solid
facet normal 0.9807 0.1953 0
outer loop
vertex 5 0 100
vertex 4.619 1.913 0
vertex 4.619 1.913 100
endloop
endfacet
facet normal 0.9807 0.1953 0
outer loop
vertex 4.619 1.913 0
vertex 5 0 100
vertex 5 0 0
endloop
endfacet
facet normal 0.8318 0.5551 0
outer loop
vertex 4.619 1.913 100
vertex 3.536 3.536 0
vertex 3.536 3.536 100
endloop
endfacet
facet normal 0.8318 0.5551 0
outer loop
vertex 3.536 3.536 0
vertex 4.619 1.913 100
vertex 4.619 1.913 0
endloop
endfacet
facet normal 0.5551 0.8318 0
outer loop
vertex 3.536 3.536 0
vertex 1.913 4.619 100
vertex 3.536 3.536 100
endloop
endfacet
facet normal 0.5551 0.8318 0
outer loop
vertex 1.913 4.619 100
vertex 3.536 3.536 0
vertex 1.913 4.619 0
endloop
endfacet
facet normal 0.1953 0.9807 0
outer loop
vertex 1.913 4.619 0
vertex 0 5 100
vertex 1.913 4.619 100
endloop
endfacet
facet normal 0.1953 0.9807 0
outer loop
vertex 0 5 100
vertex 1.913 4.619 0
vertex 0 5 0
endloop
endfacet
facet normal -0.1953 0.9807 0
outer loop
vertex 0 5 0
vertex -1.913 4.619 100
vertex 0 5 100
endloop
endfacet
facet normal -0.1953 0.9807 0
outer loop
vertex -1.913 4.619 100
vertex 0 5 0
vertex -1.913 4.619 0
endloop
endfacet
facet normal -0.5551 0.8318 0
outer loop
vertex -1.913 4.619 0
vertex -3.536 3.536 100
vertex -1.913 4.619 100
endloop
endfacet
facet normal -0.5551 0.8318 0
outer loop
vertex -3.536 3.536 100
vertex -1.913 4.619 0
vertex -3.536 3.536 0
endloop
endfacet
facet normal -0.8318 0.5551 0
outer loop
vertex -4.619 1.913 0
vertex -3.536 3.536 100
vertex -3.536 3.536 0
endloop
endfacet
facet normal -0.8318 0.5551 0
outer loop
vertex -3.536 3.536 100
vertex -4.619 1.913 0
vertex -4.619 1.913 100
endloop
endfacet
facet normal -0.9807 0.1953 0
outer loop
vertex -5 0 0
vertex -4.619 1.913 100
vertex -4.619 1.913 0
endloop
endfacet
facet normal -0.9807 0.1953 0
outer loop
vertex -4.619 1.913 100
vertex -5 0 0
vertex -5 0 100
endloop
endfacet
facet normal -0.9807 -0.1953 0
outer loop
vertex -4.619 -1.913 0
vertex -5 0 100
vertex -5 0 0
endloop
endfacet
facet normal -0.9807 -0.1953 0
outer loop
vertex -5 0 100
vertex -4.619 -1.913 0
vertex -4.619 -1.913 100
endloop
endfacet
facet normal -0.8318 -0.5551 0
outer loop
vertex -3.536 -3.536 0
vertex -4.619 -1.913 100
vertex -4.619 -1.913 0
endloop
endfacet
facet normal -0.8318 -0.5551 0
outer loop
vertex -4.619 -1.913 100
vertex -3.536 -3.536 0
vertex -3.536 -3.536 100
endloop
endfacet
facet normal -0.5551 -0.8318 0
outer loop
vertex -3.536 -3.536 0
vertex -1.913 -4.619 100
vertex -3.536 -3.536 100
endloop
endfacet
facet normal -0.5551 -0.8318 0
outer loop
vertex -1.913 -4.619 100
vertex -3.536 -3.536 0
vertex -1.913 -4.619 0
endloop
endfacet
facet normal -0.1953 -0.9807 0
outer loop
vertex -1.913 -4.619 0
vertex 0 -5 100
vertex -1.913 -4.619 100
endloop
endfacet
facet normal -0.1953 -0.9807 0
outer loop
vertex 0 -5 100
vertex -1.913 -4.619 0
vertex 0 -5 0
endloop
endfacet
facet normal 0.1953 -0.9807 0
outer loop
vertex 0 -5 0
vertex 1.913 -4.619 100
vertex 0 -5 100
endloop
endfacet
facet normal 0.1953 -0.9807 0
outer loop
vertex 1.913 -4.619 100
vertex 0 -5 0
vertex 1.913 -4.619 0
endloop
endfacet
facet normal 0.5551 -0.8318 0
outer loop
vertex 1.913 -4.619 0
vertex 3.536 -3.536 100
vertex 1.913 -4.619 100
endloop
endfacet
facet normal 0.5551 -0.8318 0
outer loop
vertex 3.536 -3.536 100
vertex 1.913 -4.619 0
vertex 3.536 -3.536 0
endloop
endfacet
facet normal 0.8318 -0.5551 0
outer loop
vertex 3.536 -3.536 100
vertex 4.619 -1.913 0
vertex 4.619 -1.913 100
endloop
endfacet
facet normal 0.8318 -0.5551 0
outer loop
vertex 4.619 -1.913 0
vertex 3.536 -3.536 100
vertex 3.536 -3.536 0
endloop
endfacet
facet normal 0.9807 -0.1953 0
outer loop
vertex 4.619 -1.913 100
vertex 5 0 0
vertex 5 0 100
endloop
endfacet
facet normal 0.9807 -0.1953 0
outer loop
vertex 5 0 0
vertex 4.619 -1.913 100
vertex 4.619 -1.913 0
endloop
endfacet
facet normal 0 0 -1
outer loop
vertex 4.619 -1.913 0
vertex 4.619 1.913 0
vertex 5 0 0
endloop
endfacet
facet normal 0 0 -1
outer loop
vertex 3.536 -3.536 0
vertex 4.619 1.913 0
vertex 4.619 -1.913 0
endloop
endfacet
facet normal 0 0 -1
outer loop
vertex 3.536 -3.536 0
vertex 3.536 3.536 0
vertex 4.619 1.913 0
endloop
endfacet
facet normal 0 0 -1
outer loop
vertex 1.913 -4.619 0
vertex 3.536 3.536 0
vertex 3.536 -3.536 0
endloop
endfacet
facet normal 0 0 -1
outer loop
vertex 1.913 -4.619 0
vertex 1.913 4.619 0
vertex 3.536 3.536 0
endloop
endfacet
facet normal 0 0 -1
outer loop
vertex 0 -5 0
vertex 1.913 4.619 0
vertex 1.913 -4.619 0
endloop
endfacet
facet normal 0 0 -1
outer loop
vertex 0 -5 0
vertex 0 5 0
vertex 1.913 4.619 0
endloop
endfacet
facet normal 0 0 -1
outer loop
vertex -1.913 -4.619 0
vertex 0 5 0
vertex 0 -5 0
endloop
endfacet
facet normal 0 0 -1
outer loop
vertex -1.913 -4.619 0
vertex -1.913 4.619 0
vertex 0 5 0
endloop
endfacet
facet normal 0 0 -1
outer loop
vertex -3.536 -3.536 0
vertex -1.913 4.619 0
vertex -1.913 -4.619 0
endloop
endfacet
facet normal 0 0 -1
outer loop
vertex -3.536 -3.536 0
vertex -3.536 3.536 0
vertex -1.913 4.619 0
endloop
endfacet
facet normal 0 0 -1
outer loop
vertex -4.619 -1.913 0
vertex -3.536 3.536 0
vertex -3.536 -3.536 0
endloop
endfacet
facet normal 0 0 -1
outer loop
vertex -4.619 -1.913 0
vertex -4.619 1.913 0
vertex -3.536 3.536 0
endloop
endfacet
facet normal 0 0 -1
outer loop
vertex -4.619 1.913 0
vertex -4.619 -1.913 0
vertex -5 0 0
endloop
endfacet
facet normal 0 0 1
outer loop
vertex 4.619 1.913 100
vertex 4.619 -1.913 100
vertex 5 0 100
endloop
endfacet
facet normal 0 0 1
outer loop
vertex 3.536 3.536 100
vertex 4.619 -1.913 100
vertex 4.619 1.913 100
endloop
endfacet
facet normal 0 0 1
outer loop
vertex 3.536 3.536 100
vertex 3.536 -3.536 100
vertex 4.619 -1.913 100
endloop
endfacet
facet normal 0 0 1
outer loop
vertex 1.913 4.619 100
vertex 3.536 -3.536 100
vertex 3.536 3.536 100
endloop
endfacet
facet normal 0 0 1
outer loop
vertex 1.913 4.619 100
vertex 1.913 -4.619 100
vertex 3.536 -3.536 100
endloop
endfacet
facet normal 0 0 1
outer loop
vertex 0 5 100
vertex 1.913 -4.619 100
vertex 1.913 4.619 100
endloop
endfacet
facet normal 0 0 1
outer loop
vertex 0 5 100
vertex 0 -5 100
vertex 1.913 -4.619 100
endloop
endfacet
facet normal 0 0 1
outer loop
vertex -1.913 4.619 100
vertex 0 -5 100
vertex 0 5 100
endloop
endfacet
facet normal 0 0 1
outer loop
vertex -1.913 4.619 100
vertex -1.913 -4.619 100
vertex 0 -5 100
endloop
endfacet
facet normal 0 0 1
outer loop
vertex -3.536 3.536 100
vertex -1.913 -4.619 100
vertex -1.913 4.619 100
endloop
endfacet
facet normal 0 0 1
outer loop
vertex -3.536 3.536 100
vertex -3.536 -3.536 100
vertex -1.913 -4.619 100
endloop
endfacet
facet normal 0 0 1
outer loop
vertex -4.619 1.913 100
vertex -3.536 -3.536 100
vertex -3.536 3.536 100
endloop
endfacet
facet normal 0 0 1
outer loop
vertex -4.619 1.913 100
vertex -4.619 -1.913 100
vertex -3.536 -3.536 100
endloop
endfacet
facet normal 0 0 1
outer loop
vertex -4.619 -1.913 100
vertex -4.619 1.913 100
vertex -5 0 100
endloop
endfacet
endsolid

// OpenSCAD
// file: included_file.scad
// A file referenced via include<> — has var + module

includedVar = 100;

module includedModule() {
  cylinder(h=includedVar, r=5);
}
// main file
include <included_file.scad>

ExtraVar = 20;

includedModule();
